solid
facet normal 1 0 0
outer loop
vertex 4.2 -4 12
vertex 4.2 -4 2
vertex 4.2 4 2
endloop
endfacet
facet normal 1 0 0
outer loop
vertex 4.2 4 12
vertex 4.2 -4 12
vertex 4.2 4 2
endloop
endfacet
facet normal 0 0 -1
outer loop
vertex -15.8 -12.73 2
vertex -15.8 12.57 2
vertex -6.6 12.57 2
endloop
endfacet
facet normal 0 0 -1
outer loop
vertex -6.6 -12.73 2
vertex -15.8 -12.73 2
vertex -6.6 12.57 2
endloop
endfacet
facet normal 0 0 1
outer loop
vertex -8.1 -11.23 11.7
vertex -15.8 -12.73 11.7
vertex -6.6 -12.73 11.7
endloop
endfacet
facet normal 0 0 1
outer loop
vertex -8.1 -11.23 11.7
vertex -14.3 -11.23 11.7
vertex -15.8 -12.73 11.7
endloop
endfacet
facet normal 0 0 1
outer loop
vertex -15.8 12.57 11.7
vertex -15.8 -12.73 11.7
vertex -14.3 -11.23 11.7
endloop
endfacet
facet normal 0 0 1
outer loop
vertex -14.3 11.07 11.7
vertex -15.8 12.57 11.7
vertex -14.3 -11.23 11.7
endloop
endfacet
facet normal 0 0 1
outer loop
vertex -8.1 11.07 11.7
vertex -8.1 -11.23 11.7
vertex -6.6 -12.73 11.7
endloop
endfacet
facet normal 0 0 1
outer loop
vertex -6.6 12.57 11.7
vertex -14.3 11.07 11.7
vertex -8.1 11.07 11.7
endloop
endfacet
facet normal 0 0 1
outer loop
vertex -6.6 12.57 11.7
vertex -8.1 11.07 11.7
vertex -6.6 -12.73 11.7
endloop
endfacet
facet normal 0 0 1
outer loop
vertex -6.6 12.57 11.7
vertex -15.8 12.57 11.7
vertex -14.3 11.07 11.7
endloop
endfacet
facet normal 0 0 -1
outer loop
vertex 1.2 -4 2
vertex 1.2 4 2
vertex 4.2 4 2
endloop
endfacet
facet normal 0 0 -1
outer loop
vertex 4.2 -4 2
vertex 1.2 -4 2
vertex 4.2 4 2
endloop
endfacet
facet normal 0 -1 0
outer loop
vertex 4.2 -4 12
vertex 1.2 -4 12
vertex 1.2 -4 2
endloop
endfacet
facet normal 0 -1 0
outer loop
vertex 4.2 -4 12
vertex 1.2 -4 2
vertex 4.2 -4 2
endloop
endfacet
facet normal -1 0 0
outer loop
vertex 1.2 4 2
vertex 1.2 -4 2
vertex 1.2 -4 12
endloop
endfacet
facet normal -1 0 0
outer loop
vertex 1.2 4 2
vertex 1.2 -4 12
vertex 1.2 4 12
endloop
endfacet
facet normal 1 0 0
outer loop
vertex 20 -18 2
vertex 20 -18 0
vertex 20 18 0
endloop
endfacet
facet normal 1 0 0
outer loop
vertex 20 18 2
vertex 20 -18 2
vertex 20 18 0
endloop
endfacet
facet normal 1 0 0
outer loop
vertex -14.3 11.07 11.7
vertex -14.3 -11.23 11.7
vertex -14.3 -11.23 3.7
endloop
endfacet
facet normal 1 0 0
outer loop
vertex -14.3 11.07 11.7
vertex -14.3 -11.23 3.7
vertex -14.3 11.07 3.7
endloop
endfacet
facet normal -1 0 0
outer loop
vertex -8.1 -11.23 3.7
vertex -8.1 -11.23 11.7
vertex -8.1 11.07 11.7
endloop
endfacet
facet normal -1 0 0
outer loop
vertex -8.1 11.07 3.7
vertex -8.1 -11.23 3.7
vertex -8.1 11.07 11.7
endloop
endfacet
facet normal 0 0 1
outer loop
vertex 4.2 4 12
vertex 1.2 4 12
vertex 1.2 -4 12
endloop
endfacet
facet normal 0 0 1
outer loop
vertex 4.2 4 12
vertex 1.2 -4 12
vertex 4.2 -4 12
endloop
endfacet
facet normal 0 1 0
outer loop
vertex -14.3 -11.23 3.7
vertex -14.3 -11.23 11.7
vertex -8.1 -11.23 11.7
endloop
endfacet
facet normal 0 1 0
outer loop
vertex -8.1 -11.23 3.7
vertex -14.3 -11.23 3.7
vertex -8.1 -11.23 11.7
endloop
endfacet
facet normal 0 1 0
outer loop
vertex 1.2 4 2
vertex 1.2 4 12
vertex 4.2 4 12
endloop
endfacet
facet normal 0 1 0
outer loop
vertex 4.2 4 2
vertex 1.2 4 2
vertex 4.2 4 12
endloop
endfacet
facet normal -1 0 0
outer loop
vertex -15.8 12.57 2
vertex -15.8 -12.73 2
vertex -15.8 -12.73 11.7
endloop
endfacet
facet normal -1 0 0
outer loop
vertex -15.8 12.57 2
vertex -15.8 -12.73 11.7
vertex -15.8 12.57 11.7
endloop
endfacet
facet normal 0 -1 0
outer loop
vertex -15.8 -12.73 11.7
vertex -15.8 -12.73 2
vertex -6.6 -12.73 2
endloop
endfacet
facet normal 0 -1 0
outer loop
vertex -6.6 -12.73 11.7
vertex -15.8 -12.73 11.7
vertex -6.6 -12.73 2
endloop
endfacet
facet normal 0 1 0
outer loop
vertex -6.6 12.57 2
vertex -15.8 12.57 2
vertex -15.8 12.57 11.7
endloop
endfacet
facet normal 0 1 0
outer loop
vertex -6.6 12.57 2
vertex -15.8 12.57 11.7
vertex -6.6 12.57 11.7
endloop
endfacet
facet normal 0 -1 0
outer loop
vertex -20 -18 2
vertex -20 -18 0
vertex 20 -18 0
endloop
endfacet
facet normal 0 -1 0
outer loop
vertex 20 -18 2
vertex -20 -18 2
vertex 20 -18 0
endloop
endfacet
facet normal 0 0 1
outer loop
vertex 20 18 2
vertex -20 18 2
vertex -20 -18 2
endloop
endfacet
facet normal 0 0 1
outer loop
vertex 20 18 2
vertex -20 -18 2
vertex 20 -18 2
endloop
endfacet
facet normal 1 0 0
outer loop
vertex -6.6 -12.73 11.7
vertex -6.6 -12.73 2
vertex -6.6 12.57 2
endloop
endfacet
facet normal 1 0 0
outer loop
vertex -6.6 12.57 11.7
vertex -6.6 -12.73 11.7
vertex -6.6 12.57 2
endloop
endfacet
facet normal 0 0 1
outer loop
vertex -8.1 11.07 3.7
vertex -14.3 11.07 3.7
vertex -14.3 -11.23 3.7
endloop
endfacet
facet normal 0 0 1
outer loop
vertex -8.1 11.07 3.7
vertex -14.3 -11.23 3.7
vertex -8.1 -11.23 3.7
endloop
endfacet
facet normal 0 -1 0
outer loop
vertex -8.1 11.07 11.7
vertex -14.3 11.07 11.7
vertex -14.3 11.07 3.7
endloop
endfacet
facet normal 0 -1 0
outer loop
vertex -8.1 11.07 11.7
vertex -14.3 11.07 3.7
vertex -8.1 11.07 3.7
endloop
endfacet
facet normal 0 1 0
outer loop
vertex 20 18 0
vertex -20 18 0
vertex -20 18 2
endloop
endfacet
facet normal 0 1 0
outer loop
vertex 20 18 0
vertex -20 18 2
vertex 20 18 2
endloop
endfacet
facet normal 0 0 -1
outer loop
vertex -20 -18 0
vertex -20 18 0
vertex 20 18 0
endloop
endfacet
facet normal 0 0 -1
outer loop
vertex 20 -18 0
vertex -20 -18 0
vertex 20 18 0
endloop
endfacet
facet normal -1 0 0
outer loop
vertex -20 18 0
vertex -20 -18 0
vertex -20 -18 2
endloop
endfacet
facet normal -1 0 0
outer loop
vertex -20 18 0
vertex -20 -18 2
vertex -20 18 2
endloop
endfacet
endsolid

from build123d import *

# Parameters (mm, degrees)
F0_W     = 40
F0_H     = 36
F1_DEPTH = 2
F2_W     = 9.2
F2_H     = 25.3
F3_DEPTH = 9.7
F4_W     = 6.2
F4_H     = 22.3
F5_DEPTH = 8
F6_W     = 3
F6_H     = 8
F7_DEPTH = 10


with BuildPart() as f1:
    # F0 (on Top) → F1 (new body)
    with BuildSketch(Plane.XY):
        Rectangle(F0_W, F0_H)
    extrude(amount=F1_DEPTH)


with BuildPart() as f3:
    # F2 (on face) → F3 (new body)
    with BuildSketch(Plane.XY.offset(2)):
        with Locations((-11.2, -0.08)):
            Rectangle(F2_W, F2_H)
    extrude(amount=F3_DEPTH)

    # F4 (on face) → F5 (cut)
    with BuildSketch(Plane.XY.offset(11.7)):
        with Locations((-11.2, -0.08)):
            Rectangle(F4_W, F4_H)
    extrude(amount=-F5_DEPTH, mode=Mode.SUBTRACT)


with BuildPart() as f7:
    # F6 (on face) → F7 (new body)
    with BuildSketch(Plane.XY.offset(2)):
        with Locations((2.7, 0)):
            Rectangle(F6_W, F6_H)
    extrude(amount=F7_DEPTH)


solid = Compound([f1.part, f3.part, f7.part])
